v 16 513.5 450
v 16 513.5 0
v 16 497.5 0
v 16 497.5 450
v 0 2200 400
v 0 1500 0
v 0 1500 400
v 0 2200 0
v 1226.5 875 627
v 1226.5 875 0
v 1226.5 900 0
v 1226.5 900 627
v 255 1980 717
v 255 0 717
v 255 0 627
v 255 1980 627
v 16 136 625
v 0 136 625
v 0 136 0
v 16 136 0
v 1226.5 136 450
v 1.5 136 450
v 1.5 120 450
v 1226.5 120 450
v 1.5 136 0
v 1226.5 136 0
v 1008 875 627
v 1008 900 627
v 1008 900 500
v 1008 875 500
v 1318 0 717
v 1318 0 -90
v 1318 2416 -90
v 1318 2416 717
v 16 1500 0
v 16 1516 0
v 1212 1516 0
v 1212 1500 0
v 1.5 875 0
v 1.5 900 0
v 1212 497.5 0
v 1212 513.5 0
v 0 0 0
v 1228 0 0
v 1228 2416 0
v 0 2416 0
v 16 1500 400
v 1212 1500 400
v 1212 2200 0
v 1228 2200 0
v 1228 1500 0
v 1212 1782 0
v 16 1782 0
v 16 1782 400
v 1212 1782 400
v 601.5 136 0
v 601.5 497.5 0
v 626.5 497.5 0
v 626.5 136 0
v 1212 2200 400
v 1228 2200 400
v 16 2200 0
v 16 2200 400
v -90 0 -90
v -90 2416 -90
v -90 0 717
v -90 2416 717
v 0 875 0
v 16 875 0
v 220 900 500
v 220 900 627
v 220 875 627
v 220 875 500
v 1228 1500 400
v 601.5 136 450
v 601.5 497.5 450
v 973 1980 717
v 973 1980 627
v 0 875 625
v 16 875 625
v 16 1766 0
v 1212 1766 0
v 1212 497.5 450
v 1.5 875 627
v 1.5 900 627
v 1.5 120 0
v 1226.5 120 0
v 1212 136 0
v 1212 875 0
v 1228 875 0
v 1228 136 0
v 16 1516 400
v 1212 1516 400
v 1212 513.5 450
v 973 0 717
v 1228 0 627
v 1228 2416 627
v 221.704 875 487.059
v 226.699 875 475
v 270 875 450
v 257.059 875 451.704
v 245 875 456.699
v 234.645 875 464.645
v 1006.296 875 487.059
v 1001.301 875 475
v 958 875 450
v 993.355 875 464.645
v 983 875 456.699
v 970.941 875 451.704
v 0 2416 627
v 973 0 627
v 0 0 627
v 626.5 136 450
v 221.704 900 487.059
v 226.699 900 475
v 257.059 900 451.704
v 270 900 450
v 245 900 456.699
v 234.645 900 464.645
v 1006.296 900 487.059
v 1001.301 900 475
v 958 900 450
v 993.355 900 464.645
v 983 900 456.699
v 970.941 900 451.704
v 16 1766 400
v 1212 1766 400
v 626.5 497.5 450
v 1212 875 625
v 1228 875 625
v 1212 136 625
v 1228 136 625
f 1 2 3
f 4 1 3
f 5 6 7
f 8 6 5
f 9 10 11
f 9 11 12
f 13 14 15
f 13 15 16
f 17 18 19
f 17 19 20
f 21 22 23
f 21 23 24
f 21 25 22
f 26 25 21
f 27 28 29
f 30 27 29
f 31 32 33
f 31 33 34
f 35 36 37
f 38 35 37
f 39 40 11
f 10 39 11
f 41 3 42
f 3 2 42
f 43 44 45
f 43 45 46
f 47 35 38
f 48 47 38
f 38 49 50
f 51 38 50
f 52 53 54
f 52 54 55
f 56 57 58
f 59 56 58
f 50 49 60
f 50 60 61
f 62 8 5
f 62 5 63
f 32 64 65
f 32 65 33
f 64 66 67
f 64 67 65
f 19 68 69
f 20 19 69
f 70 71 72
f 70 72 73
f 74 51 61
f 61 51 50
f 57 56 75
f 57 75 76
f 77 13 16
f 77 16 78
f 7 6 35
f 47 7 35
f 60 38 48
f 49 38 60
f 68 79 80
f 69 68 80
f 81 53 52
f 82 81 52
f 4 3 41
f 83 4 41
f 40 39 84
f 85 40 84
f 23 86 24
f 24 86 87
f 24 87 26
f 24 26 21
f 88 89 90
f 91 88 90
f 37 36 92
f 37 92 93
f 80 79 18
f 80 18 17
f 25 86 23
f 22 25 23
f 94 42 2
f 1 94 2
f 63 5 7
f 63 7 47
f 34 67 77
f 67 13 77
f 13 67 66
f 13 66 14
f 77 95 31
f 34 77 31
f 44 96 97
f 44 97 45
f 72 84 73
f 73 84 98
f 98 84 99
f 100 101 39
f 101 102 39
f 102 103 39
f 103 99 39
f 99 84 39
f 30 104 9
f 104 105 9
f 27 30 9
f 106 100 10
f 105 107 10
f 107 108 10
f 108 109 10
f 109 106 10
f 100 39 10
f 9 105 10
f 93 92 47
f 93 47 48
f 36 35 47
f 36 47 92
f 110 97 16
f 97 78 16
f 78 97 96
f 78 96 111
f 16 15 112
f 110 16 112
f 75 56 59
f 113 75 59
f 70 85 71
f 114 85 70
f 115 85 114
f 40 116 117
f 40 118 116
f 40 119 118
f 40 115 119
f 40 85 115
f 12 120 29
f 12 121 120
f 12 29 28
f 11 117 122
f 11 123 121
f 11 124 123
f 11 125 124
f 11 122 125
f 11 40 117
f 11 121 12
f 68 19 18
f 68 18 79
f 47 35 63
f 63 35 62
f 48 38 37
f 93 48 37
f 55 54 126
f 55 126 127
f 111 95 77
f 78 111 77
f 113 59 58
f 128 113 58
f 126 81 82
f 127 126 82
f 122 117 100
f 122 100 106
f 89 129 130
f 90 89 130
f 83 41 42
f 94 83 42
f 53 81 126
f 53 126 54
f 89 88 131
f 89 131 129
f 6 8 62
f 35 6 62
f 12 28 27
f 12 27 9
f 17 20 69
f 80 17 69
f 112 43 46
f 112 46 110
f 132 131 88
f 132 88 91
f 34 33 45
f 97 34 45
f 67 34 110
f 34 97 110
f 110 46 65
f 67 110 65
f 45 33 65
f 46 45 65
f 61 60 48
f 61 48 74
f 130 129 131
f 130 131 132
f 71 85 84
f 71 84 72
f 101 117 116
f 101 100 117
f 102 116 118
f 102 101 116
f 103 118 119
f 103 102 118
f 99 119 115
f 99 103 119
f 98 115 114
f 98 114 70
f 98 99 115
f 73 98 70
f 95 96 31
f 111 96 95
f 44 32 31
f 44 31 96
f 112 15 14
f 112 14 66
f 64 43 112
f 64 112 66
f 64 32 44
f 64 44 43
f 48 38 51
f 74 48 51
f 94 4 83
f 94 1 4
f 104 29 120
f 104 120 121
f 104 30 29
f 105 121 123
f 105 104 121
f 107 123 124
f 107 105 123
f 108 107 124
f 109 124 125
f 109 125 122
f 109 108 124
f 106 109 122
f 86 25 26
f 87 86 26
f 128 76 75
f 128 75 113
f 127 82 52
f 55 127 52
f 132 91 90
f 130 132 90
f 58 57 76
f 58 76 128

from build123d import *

# Parameters (mm, degrees)
SKETCH1_W             = 718
SKETCH1_H             = 90
BOSS_EXTRUDE1_DEPTH   = 2416
SKETCH2_W             = 718
SKETCH2_H             = 1980
CUT_EXTRUDE1_DEPTH    = 100
SKETCH6_W             = 16
SKETCH6_H             = 739
BOSS_EXTRUDE2_DEPTH   = 625
BOSS_EXTRUDE2_2_DEPTH = 625
SKETCH6_W_2           = 25
SKETCH6_H_2           = 361.5
BOSS_EXTRUDE2_3_DEPTH = 625
SKETCH7_W             = 1228
SKETCH7_H             = 16
BOSS_EXTRUDE3_DEPTH   = 450
BOSS_EXTRUDE3_2_DEPTH = 450
SKETCH7_H_2           = 25
BOSS_EXTRUDE3_3_DEPTH = 450
SKETCH8_W             = 16
SKETCH8_H             = 700
BOSS_EXTRUDE4_DEPTH   = 400
BOSS_EXTRUDE4_2_DEPTH = 400
SKETCH9_W             = 1196
SKETCH9_H             = 16
BOSS_EXTRUDE5_DEPTH   = 400
BOSS_EXTRUDE5_2_DEPTH = 400
SKETCH11_W            = 220
SKETCH11_H            = 177
BOSS_EXTRUDE6_DEPTH   = 25
FILLET1_R             = 50
SKETCH12_W            = 25
SKETCH12_H            = 361.5
CUT_EXTRUDE2_DEPTH    = 175
SKETCH18_W            = 1.5
SKETCH18_H            = 627
CUT_EXTRUDE5_DEPTH    = 2743.777606734


with BuildPart() as part:
    # Sketch1 → Boss-Extrude1 (new body)
    with BuildSketch(Plane(origin=(0, 0, 0), x_dir=(1, 0, 0), z_dir=(0, 1, 0))):
        Polygon((973, -627), (1228, -627), (1228, 0), (0, 0), (0, -627), (255, -627), (255, -717), (-90, -717), (-90, 90), (1318, 90), (1318, -717), (973, -717), align=None)
        with Locations((614, -672)):
            Rectangle(SKETCH1_W, SKETCH1_H)
    extrude(amount=BOSS_EXTRUDE1_DEPTH)

    # Sketch2 → Cut-Extrude1 (cut)
    with BuildSketch(Plane.XY.offset(717)):
        with Locations((614, 990)):
            Rectangle(SKETCH2_W, SKETCH2_H)
    extrude(amount=-CUT_EXTRUDE1_DEPTH, mode=Mode.SUBTRACT)


with BuildPart() as body_2:
    # Sketch6 → Boss-Extrude2 (new body)
    with BuildSketch(Plane.XY):
        with Locations((8, 505.5)):
            Rectangle(SKETCH6_W, SKETCH6_H)
    extrude(amount=BOSS_EXTRUDE2_DEPTH)


with BuildPart() as body_3:
    # Sketch6 → Boss-Extrude2 2 (new body)
    with BuildSketch(Plane.XY):
        with Locations((1220, 505.5)):
            Rectangle(SKETCH6_W, SKETCH6_H)
    extrude(amount=BOSS_EXTRUDE2_2_DEPTH)


with BuildPart() as body_4:
    # Sketch6 → Boss-Extrude2 3 (new body)
    with BuildSketch(Plane.XY):
        with Locations((614, 316.75)):
            Rectangle(SKETCH6_W_2, SKETCH6_H_2)
    extrude(amount=BOSS_EXTRUDE2_3_DEPTH)

    # Sketch12 → Cut-Extrude2 (cut)
    with BuildSketch(Plane.XY.offset(625)):
        with Locations((614, 316.75)):
            Rectangle(SKETCH12_W, SKETCH12_H)
    extrude(amount=-CUT_EXTRUDE2_DEPTH, mode=Mode.SUBTRACT)


with BuildPart() as body_5:
    # Sketch7 → Boss-Extrude3 (new body)
    with BuildSketch(Plane.XY):
        with Locations((614, 128)):
            Rectangle(SKETCH7_W, SKETCH7_H)
    extrude(amount=BOSS_EXTRUDE3_DEPTH)


with BuildPart() as body_6:
    # Sketch7 → Boss-Extrude3 2 (new body)
    with BuildSketch(Plane.XY):
        Polygon((16, 497.5), (626.5, 497.5), (1212, 497.5), (1212, 513.5), (601.5, 513.5), (16, 513.5), align=None)
    extrude(amount=BOSS_EXTRUDE3_2_DEPTH)


with BuildPart() as body_7:
    # Sketch7 → Boss-Extrude3 3 (new body)
    with BuildSketch(Plane.XY):
        with Locations((614, 887.5)):
            Rectangle(SKETCH7_W, SKETCH7_H_2)
    extrude(amount=BOSS_EXTRUDE3_3_DEPTH)

    # Sketch11 → Boss-Extrude6 (add)
    with BuildSketch(Plane(origin=(0, 900, 0), x_dir=(1, 0, 0), z_dir=(0, 1, 0))):
        with Locations((110, -538.5)):
            Rectangle(SKETCH11_W, SKETCH11_H)
        with Locations((1118, -538.5)):
            Rectangle(SKETCH11_W, SKETCH11_H)
    extrude(amount=-BOSS_EXTRUDE6_DEPTH)

    # Fillet1
    fillet1_edges = [body_7.edges().sort_by_distance(p)[0] for p in [
        (220, 887.5, 450),
        (1008, 887.5, 450),
    ]]
    fillet(fillet1_edges, radius=FILLET1_R)


with BuildPart() as body_8:
    # Sketch8 → Boss-Extrude4 (new body)
    with BuildSketch(Plane.XY):
        with Locations((8, 1850)):
            Rectangle(SKETCH8_W, SKETCH8_H)
    extrude(amount=BOSS_EXTRUDE4_DEPTH)


with BuildPart() as body_9:
    # Sketch8 → Boss-Extrude4 2 (new body)
    with BuildSketch(Plane.XY):
        with Locations((1220, 1850)):
            Rectangle(SKETCH8_W, SKETCH8_H)
    extrude(amount=BOSS_EXTRUDE4_2_DEPTH)


with BuildPart() as body_10:
    # Sketch9 → Boss-Extrude5 (new body)
    with BuildSketch(Plane.XY):
        with Locations((614, 1774)):
            Rectangle(SKETCH9_W, SKETCH9_H)
    extrude(amount=BOSS_EXTRUDE5_DEPTH)


with BuildPart() as body_11:
    # Sketch9 → Boss-Extrude5 2 (new body)
    with BuildSketch(Plane.XY):
        with Locations((614, 1508)):
            Rectangle(SKETCH9_W, SKETCH9_H)
    extrude(amount=BOSS_EXTRUDE5_2_DEPTH)


with BuildPart() as cut_extrude5_tool:
    # Sketch18 → Cut-Extrude5 (new, through all)
    with BuildSketch(Plane.XZ.offset(-120)):
        with Locations((0.75, 313.5)):
            Rectangle(SKETCH18_W, SKETCH18_H)
        with Locations((1227.25, 313.5)):
            Rectangle(SKETCH18_W, SKETCH18_H)
    extrude(amount=-CUT_EXTRUDE5_DEPTH)


with BuildPart() as body_5_1:
    add(body_5.part)

    # Cut-Extrude5: cut by cut_extrude5_tool
    add(cut_extrude5_tool.part, mode=Mode.SUBTRACT)


with BuildPart() as body_7_1:
    add(body_7.part)

    # Cut-Extrude5: cut by cut_extrude5_tool
    add(cut_extrude5_tool.part, mode=Mode.SUBTRACT)


solid = Compound([part.part, body_2.part, body_3.part, body_4.part, body_6.part, body_8.part, body_9.part, body_10.part, body_11.part, body_5_1.part, body_7_1.part])
